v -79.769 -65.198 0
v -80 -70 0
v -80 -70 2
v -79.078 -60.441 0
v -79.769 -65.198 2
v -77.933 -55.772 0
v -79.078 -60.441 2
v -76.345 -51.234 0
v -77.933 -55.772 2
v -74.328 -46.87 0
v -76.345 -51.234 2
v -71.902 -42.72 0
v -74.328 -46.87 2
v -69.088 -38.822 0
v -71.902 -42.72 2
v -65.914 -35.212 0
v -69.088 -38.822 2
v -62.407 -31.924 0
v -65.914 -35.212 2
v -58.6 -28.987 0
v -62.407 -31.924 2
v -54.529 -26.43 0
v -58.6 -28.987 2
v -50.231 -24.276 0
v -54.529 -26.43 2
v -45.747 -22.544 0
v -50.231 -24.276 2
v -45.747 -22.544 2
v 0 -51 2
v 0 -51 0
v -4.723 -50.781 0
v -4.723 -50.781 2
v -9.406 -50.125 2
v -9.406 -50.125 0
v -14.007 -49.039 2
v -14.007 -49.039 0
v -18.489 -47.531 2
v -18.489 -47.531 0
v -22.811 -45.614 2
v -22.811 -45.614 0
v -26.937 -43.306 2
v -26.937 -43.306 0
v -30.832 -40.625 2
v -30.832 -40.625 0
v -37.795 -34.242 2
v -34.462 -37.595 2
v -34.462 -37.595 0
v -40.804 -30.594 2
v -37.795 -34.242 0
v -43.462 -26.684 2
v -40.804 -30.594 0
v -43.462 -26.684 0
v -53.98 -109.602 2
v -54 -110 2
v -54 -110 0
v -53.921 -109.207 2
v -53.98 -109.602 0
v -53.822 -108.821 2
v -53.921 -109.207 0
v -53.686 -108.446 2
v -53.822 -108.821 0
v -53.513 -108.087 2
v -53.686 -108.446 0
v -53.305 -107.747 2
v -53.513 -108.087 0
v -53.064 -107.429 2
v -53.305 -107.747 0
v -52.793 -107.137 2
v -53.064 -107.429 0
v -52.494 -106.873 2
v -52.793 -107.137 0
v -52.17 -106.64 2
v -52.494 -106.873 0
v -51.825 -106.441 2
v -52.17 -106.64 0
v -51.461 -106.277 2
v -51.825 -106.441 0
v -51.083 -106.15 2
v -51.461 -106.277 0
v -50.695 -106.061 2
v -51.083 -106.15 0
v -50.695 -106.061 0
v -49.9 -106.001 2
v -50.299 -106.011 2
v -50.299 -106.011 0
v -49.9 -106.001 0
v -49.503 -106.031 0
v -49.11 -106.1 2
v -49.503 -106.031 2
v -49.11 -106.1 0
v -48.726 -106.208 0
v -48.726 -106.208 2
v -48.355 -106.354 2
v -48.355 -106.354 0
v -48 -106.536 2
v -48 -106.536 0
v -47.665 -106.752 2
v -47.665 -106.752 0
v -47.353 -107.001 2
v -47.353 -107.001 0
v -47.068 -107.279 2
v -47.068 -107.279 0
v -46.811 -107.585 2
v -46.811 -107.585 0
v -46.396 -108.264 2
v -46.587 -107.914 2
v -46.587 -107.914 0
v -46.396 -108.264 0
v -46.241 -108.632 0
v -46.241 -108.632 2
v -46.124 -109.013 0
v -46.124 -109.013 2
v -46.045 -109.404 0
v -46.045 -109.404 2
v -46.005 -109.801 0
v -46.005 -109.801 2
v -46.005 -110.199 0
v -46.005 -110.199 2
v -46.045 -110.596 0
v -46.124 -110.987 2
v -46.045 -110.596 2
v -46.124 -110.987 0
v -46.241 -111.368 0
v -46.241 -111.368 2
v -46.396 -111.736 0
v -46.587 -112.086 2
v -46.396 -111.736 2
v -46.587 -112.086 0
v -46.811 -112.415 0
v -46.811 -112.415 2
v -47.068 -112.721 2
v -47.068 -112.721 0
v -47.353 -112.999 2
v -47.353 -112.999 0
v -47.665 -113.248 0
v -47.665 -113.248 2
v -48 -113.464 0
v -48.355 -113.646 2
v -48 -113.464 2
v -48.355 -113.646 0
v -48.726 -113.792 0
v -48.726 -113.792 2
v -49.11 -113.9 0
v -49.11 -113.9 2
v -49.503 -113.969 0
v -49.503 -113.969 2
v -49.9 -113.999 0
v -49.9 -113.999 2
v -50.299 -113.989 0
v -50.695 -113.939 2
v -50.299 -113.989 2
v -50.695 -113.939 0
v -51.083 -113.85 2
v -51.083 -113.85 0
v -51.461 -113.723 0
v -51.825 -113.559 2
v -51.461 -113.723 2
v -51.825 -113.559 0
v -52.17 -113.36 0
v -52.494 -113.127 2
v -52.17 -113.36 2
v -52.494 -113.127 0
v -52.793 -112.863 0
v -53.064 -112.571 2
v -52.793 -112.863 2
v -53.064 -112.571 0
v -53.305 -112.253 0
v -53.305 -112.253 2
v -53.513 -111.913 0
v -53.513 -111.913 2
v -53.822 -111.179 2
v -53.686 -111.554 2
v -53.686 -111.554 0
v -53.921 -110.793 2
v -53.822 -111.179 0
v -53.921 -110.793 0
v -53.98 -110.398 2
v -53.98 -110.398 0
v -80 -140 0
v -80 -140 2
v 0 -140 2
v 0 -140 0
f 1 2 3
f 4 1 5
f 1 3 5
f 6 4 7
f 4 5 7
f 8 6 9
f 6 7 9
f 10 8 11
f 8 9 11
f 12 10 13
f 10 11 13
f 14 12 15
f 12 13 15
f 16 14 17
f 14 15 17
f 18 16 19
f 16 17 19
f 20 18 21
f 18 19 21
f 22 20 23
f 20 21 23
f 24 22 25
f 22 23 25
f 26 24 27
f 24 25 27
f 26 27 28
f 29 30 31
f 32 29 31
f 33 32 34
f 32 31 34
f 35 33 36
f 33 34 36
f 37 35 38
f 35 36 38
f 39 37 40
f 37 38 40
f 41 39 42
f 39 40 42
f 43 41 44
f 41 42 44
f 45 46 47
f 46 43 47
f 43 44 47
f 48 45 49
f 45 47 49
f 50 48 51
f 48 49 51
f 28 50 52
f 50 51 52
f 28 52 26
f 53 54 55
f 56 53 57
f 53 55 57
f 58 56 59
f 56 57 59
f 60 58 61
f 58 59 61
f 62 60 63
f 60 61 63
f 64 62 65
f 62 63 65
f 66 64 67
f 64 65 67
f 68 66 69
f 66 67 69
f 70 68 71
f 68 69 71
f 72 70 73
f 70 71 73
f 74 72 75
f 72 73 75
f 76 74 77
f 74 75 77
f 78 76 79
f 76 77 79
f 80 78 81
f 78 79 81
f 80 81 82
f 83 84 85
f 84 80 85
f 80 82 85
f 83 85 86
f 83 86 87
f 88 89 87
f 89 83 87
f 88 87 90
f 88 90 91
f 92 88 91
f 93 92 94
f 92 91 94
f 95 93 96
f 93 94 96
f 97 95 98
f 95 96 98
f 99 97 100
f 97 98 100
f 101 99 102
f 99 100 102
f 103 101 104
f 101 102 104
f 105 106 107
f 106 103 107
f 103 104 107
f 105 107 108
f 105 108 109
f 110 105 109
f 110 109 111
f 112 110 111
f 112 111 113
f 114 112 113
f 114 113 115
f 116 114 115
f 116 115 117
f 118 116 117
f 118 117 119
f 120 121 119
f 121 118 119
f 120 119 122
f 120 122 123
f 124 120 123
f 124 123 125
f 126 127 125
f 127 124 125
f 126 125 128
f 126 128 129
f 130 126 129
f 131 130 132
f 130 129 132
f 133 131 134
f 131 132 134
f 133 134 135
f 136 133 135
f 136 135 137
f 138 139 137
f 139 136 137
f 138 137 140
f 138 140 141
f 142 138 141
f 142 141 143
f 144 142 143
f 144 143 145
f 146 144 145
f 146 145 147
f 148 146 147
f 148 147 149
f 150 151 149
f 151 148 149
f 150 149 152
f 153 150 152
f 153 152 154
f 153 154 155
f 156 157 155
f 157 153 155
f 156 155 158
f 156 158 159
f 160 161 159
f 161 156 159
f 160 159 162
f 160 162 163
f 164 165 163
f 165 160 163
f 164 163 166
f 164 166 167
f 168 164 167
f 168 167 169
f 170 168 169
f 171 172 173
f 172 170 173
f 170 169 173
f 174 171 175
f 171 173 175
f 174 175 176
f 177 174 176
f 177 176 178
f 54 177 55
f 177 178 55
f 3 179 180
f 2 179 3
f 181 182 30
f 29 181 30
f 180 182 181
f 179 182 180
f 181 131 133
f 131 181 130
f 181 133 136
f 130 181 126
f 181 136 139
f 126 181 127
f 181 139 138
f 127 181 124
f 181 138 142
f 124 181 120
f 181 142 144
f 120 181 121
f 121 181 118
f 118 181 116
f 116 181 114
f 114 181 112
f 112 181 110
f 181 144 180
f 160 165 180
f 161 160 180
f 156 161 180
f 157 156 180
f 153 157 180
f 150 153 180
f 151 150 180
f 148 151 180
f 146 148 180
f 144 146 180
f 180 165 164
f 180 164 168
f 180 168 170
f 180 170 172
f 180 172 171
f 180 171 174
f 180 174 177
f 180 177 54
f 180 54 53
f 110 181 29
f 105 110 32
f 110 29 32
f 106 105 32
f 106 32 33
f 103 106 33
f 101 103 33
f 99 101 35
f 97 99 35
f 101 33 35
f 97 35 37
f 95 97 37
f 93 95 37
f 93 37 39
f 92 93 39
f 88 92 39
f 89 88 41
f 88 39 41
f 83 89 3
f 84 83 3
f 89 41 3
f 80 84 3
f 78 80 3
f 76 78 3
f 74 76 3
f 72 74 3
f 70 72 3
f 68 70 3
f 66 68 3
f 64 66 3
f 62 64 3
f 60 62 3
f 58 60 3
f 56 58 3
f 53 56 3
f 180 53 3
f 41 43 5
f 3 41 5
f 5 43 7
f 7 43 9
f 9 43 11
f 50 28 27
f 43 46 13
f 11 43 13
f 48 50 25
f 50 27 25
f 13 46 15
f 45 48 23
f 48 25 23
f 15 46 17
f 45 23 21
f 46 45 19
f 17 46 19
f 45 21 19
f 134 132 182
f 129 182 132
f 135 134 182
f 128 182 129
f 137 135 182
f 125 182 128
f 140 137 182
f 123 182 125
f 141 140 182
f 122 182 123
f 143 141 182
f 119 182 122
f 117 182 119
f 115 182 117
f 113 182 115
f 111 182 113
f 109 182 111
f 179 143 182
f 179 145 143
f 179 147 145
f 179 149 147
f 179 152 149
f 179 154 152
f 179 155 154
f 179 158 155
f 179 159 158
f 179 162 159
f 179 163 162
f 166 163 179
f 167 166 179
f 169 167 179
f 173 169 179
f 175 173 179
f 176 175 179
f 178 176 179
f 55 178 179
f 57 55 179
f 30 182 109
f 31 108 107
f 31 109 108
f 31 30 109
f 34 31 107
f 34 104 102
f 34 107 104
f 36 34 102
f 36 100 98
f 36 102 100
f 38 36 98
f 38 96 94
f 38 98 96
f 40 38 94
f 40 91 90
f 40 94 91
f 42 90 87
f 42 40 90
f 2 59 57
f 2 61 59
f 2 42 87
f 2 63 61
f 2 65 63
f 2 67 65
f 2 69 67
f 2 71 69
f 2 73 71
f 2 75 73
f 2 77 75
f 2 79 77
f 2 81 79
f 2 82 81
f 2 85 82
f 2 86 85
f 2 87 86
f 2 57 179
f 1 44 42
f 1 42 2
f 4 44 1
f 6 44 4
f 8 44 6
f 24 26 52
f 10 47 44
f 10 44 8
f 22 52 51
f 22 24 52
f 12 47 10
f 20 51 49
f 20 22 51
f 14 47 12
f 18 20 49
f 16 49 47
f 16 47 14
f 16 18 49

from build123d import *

# Parameters (mm, degrees)
CYLINDER016_R     = 51
CYLINDER016_DEPTH = 10
CYLINDER_R        = 4
CYLINDER_DEPTH    = 10
BOX_W             = 80
BOX_H             = 120
BOX_DEPTH         = 2
FILLET_R          = 50


with BuildPart() as cylinder017:
    # Cylinder016 → Cylinder016 (new body)
    with BuildSketch(Plane.XY):
        Circle(CYLINDER016_R)
    extrude(amount=CYLINDER016_DEPTH)


with BuildPart() as cylinder:
    # Cylinder → Cylinder (new body)
    with BuildSketch(Plane(origin=(50, -110, 0), x_dir=(1, 0, 0), z_dir=(0, 0, 1))):
        Circle(CYLINDER_R)
    extrude(amount=CYLINDER_DEPTH)


with BuildPart() as cut010:
    # Box → Box (new body)
    with BuildSketch(Plane(origin=(0, -140, 0), x_dir=(1, 0, 0), z_dir=(0, 0, 1))):
        with Locations((40, 60)):
            Rectangle(BOX_W, BOX_H)
    extrude(amount=BOX_DEPTH)

    # Fillet
    fillet_edges = [cut010.edges().sort_by_distance(p)[0] for p in [
        (80, -20, 1),
    ]]
    fillet(fillet_edges, radius=FILLET_R)

    # Cut: cut Cylinder
    add(cylinder.part, mode=Mode.SUBTRACT)

    # Cut010: cut Cylinder017
    add(cylinder017.part, mode=Mode.SUBTRACT)


with BuildPart() as part_mirroring:
    # Part__Mirroring: instance of Cut010
    add(cut010.part.mirror(Plane(origin=(0, 0, 0), x_dir=(0, -1, 0), z_dir=(1, 0, 0))))


solid = part_mirroring.part
